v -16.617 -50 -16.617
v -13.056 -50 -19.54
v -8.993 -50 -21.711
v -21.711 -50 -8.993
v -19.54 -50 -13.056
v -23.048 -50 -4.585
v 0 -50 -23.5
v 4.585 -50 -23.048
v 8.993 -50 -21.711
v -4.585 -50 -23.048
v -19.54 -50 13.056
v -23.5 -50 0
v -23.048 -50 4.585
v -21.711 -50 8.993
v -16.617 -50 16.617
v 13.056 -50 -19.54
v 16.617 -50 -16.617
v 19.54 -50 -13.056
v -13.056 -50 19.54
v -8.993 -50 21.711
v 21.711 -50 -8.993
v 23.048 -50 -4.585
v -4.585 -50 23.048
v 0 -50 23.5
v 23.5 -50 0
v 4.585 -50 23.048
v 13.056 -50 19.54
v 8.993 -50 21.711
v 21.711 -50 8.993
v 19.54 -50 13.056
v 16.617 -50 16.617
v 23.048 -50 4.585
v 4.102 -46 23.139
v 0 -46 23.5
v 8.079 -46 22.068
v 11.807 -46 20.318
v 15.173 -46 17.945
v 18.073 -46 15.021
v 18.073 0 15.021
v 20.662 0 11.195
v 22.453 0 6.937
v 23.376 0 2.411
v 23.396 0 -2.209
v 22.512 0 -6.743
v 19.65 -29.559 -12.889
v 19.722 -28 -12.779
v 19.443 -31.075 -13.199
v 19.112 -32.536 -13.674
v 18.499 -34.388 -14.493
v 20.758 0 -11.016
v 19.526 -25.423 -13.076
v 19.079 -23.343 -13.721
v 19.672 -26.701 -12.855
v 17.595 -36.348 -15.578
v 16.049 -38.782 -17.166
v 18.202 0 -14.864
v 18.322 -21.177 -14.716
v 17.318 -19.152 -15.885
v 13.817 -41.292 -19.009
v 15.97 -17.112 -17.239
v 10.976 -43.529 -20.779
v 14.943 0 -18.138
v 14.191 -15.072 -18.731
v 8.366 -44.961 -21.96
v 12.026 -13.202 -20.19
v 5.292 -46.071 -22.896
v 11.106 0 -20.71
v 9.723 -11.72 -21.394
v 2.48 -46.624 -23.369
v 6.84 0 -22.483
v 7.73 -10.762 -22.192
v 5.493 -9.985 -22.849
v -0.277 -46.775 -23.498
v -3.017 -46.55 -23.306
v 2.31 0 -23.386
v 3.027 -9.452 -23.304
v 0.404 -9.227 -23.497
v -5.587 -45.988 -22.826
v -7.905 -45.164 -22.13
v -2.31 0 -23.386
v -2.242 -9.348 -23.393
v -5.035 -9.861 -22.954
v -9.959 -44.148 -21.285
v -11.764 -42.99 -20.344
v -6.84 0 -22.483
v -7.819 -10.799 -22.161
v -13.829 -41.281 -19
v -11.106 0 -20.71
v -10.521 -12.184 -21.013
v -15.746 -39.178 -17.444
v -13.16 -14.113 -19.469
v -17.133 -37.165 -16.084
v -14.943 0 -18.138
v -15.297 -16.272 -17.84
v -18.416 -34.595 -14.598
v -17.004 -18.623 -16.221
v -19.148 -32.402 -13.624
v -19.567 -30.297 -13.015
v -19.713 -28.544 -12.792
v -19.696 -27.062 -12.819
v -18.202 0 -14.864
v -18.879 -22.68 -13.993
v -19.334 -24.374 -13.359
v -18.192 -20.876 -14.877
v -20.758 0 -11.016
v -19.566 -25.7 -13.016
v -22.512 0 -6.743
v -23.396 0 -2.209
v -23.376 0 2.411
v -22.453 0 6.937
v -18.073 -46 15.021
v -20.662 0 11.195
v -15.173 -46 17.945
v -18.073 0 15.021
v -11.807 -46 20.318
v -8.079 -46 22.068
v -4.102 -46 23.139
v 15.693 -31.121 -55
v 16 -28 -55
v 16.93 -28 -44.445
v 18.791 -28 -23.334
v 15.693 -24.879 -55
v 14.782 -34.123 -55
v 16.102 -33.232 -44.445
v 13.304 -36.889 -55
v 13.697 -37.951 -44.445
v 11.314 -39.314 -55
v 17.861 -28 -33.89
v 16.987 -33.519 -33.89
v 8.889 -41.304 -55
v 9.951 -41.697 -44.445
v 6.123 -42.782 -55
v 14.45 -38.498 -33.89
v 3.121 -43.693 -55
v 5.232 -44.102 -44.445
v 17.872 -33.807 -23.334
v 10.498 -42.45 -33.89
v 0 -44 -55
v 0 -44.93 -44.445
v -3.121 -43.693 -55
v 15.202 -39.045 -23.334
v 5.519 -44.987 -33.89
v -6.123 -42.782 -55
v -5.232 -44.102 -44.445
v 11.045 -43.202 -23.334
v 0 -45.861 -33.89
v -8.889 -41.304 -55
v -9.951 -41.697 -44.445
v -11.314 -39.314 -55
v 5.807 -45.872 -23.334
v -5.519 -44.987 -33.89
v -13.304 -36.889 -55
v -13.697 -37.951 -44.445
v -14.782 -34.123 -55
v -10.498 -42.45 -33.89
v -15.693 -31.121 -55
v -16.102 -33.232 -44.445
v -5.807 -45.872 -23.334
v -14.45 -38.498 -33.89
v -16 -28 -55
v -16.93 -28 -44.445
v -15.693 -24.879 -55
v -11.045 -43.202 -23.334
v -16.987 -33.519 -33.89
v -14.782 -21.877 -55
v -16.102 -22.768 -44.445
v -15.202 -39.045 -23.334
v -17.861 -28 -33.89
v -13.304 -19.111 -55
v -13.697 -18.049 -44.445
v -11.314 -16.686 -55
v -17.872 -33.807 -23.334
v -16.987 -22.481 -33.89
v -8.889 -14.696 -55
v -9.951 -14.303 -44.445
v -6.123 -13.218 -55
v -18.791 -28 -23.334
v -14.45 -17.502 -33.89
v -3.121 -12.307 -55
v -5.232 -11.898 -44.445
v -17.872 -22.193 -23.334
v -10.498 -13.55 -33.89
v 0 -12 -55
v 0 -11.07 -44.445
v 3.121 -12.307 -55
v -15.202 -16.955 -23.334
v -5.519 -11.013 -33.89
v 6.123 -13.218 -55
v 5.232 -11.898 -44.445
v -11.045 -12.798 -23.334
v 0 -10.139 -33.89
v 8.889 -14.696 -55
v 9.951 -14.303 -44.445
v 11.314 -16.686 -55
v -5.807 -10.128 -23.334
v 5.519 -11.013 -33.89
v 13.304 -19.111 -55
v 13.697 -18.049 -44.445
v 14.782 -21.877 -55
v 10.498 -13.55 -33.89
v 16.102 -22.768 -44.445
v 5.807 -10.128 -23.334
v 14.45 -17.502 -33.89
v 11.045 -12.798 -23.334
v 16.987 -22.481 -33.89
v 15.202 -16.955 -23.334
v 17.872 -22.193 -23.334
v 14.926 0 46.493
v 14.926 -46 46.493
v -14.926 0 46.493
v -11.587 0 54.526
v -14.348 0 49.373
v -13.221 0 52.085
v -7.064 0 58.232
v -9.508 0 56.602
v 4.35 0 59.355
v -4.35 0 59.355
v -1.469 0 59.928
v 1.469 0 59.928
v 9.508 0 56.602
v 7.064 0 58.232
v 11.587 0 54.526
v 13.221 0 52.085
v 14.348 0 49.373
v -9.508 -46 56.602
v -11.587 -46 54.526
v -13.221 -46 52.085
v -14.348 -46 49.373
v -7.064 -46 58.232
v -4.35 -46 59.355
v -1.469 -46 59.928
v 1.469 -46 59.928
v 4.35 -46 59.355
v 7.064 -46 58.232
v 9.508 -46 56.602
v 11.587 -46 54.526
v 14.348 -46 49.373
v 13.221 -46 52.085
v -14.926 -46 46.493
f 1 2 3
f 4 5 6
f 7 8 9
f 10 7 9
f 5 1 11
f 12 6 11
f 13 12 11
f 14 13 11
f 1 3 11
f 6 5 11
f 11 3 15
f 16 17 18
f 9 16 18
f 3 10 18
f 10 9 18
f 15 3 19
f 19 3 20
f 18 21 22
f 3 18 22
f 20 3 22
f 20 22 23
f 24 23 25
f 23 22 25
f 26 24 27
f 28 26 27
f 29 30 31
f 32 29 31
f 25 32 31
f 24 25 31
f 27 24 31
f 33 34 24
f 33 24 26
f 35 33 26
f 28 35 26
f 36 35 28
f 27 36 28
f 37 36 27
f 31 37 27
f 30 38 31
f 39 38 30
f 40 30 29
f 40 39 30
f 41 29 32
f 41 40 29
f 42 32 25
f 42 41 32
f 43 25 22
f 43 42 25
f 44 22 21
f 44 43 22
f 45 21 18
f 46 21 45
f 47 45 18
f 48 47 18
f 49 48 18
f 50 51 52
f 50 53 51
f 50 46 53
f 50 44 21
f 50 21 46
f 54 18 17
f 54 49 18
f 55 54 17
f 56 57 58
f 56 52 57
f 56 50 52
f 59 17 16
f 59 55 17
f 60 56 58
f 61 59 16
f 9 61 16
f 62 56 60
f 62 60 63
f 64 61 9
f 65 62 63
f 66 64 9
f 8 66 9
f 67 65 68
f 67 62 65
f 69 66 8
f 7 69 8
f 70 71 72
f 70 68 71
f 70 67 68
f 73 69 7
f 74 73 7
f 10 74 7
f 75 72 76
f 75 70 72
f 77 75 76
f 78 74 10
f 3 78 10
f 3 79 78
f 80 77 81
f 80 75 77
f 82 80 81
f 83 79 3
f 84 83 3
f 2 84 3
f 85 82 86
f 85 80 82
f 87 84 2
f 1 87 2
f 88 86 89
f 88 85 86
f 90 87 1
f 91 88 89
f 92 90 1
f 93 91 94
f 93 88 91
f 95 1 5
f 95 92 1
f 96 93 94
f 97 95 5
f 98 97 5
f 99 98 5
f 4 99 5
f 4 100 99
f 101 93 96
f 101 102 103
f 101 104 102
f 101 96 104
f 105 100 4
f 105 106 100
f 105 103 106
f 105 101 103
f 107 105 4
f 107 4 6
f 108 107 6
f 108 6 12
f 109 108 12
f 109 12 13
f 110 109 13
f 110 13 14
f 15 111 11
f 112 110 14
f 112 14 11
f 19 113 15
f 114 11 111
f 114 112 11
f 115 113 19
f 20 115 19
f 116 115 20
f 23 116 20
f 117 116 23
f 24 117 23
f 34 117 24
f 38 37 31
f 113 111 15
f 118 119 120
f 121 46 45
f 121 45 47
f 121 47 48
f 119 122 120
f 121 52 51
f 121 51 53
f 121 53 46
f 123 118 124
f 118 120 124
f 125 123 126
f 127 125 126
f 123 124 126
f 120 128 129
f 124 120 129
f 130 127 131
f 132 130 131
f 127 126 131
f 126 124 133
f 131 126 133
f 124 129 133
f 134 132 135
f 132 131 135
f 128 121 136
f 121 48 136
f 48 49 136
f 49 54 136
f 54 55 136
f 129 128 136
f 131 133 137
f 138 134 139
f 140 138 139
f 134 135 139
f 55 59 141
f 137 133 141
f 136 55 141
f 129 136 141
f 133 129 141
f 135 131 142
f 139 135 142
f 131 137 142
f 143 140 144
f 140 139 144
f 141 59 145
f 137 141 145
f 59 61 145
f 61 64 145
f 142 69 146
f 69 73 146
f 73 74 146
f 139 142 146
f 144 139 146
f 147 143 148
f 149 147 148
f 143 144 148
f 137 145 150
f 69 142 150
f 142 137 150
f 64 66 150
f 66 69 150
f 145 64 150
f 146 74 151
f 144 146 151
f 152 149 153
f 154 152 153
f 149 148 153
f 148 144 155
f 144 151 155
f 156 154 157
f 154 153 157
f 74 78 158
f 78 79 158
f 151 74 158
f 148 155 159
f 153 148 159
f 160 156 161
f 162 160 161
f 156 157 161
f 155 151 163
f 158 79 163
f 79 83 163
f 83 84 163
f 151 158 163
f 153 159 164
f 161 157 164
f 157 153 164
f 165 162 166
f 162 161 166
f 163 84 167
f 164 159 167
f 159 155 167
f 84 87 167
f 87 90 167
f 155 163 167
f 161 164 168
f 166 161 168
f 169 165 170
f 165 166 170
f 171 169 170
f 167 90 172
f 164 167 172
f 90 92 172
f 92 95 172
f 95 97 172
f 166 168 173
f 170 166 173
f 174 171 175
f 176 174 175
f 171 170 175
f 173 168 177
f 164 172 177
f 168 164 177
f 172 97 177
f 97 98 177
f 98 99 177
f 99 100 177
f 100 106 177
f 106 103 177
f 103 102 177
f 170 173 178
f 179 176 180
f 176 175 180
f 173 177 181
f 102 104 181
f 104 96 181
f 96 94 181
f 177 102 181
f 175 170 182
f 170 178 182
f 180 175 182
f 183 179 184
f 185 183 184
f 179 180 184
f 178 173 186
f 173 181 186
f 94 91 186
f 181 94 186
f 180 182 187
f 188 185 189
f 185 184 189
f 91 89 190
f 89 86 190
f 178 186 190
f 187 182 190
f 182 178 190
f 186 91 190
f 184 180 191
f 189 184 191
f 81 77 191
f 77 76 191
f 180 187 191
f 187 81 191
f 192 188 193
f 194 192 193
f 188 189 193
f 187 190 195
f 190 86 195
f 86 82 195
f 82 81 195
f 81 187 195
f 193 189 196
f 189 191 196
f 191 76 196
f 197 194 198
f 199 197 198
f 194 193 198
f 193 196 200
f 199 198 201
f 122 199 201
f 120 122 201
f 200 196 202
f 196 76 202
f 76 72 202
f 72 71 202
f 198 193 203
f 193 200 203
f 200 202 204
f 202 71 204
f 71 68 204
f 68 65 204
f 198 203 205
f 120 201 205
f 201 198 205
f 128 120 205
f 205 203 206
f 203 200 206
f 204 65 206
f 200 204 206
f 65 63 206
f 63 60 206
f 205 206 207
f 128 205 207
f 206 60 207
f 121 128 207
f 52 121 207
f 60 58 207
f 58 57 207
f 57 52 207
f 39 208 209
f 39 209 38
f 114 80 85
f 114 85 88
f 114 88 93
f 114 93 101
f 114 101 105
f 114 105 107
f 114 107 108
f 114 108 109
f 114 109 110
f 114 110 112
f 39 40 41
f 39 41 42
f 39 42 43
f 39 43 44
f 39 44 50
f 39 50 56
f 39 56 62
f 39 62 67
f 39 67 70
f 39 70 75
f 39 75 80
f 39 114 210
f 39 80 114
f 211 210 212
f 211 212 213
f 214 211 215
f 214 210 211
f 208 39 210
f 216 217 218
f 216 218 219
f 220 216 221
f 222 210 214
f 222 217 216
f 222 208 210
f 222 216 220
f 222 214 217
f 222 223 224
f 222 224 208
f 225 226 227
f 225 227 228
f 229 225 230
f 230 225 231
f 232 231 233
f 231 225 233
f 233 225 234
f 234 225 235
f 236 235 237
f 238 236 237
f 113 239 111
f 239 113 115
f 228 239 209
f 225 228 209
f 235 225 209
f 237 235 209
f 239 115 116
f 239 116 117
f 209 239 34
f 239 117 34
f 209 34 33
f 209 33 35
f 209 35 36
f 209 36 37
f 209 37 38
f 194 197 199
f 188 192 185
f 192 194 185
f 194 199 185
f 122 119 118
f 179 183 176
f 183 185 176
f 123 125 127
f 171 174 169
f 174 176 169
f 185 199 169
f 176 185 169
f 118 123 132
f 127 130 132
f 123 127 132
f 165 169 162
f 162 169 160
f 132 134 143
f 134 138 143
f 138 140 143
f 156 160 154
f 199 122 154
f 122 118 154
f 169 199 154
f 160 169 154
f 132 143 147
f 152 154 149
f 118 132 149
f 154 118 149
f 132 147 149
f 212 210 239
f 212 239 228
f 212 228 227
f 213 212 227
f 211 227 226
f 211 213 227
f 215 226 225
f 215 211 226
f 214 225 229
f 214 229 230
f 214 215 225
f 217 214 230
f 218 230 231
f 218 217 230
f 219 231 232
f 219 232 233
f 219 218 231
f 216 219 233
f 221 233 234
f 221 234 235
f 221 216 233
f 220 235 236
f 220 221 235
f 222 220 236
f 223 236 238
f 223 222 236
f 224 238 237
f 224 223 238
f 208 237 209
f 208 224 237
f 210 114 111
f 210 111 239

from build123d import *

# Parameters (mm, degrees)
BOSS_EXTRUDE1_DEPTH = 46
SKETCH1_3_R         = 23.5
BOSS_EXTRUDE2_DEPTH = 50


with BuildPart() as part:
    # Sketch1 → Boss-Extrude1 (new body)
    with BuildSketch(Plane(origin=(0, 0, 0), x_dir=(1, 0, 0), z_dir=(0, 1, 0))):
        with BuildLine():
            ThreePointArc((18.072726342, -15.020870899), (0, -23.5), (-18.072726342, -15.020870899))
            Line((-18.072726342, -15.020870899), (-14.925557853, -46.492555785))
            ThreePointArc((-14.925557853, -46.492555785), (0, -60), (14.925557853, -46.492555785))
            Line((14.925557853, -46.492555785), (18.072726342, -15.020870899))
        make_face()
    extrude(amount=-BOSS_EXTRUDE1_DEPTH)

    # Sketch1<3> → Boss-Extrude2 (add)
    with BuildSketch(Plane(origin=(0, 0, 0), x_dir=(1, 0, 0), z_dir=(0, 1, 0))):
        Circle(SKETCH1_3_R)
    extrude(amount=-BOSS_EXTRUDE2_DEPTH)

    # Sketch2 → Revolve1 (revolve)
    with BuildSketch(Plane(origin=(0, -28, 0), x_dir=(1, 0, 0), z_dir=(0, 1, 0))):
        Polygon((-19.721704902, 12.779059268), (0, 12.779059268), (0, 55), (-16, 55), align=None)
    revolve(axis=Axis((0, -28, 0), (0, 0, -1)))


solid = part.part
